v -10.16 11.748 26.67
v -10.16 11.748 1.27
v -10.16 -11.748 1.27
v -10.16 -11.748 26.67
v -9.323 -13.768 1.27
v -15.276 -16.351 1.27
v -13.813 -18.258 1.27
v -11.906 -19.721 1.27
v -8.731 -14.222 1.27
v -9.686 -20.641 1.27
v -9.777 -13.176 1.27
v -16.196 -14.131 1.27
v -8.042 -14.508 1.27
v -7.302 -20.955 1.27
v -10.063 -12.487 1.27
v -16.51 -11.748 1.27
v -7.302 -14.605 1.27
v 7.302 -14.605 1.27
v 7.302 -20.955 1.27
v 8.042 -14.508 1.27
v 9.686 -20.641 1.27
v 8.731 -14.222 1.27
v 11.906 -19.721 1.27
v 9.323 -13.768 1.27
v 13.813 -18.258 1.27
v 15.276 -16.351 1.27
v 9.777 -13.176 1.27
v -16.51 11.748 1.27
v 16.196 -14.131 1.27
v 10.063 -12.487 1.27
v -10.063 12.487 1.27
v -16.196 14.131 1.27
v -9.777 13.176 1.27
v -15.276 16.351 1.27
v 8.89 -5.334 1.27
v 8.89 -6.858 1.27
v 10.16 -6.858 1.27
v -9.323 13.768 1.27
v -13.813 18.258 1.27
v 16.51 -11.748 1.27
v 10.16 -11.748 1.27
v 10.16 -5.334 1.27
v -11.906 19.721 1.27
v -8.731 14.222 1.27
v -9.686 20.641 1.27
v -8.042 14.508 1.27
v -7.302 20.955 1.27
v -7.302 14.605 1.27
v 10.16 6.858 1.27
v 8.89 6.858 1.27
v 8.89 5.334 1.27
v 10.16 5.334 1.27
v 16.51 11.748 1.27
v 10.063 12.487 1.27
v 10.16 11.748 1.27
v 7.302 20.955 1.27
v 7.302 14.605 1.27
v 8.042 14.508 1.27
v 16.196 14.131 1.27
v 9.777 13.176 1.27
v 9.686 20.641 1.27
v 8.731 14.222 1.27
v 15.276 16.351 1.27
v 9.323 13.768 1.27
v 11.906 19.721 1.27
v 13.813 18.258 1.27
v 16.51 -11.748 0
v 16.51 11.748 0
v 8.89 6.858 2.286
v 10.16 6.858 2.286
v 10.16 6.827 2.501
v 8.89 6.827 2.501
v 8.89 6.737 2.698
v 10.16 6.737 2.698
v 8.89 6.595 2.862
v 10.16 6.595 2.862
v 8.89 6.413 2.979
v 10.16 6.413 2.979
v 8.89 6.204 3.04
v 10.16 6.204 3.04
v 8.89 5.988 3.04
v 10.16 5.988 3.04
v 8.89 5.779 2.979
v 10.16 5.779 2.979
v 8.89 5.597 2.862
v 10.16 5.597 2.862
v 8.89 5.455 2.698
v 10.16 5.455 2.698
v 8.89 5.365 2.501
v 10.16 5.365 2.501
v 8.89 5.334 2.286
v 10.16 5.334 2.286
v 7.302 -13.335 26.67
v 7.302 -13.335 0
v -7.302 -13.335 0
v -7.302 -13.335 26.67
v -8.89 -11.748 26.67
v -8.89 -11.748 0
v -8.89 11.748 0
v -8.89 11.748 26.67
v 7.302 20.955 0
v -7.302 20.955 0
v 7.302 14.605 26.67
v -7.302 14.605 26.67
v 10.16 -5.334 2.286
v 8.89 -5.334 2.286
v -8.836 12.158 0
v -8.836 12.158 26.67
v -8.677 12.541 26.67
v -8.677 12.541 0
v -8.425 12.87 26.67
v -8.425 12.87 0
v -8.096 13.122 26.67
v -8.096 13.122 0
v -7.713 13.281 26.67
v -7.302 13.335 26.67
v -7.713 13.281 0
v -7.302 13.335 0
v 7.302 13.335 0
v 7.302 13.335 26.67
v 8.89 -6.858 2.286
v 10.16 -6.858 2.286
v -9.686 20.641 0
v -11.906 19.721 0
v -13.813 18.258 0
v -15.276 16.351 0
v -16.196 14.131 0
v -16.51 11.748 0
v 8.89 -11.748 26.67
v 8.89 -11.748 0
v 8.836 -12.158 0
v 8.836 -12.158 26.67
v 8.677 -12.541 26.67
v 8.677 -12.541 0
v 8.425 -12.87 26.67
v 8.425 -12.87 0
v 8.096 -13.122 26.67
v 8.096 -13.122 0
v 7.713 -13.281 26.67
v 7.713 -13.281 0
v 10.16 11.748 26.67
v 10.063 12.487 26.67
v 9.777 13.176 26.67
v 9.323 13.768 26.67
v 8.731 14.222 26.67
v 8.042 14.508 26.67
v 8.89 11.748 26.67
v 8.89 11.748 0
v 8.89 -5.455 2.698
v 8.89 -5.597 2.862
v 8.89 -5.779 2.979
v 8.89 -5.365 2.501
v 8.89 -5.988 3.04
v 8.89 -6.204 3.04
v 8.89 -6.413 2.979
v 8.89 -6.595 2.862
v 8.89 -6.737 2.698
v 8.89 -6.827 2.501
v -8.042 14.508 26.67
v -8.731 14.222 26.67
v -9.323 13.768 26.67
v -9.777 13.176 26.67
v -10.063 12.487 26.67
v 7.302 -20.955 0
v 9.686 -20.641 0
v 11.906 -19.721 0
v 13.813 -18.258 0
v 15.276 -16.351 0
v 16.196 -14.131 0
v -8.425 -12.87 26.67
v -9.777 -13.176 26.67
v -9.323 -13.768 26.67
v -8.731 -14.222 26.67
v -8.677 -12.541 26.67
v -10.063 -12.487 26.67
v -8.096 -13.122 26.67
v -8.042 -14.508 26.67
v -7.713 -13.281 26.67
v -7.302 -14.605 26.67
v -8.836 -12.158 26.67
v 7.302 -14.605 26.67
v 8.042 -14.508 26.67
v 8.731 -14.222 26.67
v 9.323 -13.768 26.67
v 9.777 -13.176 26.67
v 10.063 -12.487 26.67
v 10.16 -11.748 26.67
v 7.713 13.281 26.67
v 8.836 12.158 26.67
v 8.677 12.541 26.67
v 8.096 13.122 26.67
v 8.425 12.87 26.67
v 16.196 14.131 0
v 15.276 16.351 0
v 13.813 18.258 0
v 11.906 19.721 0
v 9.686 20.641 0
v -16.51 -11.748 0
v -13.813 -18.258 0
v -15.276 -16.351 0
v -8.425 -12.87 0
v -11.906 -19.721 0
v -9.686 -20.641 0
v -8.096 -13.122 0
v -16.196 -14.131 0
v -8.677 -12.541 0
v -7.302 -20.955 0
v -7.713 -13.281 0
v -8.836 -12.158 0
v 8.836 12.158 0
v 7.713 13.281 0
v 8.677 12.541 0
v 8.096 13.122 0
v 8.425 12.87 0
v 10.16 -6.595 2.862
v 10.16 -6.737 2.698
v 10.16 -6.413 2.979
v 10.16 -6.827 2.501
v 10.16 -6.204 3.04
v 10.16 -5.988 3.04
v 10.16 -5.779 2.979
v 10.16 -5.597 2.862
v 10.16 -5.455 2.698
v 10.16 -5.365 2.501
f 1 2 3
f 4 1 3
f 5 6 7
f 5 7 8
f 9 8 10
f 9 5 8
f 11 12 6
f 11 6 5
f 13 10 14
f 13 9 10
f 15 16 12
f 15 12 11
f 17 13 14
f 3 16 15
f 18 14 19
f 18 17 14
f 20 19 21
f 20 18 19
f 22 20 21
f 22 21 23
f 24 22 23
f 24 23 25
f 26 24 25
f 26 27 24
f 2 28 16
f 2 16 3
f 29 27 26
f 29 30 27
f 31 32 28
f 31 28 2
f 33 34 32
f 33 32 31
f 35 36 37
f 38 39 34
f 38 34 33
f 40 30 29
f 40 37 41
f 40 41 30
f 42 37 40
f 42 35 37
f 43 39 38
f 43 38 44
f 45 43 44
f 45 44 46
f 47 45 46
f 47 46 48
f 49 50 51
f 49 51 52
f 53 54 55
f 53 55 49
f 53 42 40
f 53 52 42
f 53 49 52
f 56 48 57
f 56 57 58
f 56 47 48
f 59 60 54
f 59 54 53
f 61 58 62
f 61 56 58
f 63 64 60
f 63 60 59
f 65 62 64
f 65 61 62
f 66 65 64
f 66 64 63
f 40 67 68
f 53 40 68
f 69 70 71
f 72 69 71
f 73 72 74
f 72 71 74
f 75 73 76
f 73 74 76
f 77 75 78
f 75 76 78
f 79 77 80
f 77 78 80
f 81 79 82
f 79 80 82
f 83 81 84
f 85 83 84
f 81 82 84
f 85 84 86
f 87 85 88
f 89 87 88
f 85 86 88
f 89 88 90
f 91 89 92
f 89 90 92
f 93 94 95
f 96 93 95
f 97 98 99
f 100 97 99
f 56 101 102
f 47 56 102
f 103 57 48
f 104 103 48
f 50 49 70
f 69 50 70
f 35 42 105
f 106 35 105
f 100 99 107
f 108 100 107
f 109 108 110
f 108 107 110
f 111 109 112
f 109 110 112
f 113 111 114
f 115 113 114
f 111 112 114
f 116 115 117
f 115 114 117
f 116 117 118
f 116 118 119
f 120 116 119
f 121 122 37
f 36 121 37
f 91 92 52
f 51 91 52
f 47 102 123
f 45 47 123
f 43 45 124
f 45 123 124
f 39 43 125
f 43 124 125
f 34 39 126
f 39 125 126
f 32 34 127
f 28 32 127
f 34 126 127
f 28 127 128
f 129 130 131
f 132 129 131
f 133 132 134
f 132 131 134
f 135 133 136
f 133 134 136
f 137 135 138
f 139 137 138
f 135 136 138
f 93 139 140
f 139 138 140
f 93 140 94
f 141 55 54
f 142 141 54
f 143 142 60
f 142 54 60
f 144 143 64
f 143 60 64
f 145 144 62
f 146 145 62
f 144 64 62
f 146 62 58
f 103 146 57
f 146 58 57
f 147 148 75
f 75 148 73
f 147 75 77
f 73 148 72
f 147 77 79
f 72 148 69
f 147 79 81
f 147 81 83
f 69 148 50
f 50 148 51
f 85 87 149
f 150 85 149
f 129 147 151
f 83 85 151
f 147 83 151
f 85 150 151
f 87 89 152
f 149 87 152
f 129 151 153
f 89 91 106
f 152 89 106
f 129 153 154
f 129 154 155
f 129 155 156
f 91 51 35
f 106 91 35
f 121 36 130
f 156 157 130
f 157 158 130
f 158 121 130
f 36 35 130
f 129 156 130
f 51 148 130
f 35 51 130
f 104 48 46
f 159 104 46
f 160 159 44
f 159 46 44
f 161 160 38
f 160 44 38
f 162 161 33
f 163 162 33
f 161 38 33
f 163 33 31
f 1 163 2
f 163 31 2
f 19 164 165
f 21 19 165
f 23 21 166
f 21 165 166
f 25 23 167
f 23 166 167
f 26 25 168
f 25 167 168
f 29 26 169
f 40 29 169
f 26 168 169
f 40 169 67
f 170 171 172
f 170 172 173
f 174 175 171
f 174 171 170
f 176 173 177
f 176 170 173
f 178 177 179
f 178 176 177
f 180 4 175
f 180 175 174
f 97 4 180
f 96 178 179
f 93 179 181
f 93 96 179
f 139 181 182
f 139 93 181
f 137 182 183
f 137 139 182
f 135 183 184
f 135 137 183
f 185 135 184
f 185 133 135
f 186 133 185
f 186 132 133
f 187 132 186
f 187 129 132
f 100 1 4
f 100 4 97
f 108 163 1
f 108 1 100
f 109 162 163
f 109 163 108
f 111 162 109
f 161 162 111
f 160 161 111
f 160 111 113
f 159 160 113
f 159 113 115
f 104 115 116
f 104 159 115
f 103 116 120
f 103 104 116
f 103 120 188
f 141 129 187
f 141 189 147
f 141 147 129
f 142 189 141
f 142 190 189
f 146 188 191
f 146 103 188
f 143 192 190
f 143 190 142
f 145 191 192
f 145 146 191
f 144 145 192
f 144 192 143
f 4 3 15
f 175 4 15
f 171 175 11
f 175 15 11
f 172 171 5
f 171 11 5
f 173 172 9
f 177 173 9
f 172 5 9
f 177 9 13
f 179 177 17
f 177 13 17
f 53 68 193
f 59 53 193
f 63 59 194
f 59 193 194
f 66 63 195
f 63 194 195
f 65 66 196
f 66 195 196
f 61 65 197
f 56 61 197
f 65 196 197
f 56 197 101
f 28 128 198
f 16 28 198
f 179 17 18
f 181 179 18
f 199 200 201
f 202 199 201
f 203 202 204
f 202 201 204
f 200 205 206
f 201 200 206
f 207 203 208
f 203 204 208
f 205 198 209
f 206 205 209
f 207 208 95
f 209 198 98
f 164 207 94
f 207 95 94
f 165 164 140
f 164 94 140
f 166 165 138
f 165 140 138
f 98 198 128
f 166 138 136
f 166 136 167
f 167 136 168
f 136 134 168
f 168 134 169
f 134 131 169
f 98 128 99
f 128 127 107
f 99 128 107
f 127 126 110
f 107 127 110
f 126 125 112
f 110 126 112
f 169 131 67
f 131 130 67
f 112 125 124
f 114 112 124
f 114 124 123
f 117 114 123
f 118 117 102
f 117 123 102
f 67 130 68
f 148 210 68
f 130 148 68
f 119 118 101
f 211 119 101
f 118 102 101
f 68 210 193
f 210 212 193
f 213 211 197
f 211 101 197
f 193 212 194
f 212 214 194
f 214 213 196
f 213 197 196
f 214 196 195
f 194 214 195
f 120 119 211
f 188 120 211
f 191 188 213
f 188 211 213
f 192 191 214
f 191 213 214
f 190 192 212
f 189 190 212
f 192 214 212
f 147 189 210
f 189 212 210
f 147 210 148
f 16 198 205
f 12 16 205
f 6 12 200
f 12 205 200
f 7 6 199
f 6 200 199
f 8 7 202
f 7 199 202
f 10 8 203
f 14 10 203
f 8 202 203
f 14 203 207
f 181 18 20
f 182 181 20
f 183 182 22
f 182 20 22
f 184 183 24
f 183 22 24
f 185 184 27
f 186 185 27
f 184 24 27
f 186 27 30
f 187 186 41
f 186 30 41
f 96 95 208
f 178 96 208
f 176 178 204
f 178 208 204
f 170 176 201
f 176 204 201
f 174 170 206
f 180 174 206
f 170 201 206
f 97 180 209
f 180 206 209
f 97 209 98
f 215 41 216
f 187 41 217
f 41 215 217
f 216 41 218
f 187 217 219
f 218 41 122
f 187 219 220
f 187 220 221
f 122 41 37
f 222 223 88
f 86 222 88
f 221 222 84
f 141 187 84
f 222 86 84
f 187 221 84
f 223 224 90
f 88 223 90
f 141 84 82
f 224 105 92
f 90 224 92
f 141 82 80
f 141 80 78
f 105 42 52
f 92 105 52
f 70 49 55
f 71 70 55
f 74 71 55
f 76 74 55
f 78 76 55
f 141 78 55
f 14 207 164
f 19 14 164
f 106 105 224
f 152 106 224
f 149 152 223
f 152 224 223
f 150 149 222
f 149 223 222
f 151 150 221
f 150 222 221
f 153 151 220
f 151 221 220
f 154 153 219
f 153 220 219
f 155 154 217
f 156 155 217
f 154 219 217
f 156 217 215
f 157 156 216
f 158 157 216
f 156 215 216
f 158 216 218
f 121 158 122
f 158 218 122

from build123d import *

# Parameters (mm, degrees)
F1_DEPTH = 25.4
F2_DEPTH = 1.27
F4_DEPTH = 1.27


with BuildPart() as f1:
    # F0 (on Top) → F1 (new body)
    with BuildSketch(Plane.XY):
        with BuildLine():
            Line((10.16, -11.7475), (10.16, 11.7475))
            ThreePointArc((10.16, 11.7475), (9.323058, 13.768058), (7.3025, 14.605))
            Line((7.3025, 14.605), (-7.3025, 14.605))
            ThreePointArc((-7.3025, 14.605), (-9.323058, 13.768058), (-10.16, 11.7475))
            Line((-10.16, 11.7475), (-10.16, -11.7475))
            ThreePointArc((-10.16, -11.7475), (-9.323058, -13.768058), (-7.3025, -14.605))
            Line((-7.3025, -14.605), (7.3025, -14.605))
            ThreePointArc((7.3025, -14.605), (9.323058, -13.768058), (10.16, -11.7475))
        make_face()
        with BuildLine():
            Line((-7.3025, 13.335), (7.3025, 13.335))
            ThreePointArc((7.3025, 13.335), (8.425032, 12.870032), (8.89, 11.7475))
            Line((8.89, 11.7475), (8.89, -11.7475))
            ThreePointArc((8.89, -11.7475), (8.425032, -12.870032), (7.3025, -13.335))
            Line((7.3025, -13.335), (-7.3025, -13.335))
            ThreePointArc((-7.3025, -13.335), (-8.425032, -12.870032), (-8.89, -11.7475))
            Line((-8.89, -11.7475), (-8.89, 11.7475))
            ThreePointArc((-8.89, 11.7475), (-8.425032, 12.870032), (-7.3025, 13.335))
        make_face(mode=Mode.SUBTRACT)
    extrude(amount=F1_DEPTH)

    # F0 (on Top) + F1_face (on face) → F2 (join)
    with BuildSketch(Plane.XY):
        with BuildLine():
            Line((7.3025, 20.955), (-7.3025, 20.955))
            ThreePointArc((-7.3025, 20.955), (-13.813186, 18.258186), (-16.51, 11.7475))
            Line((-16.51, 11.7475), (-16.51, -11.7475))
            ThreePointArc((-16.51, -11.7475), (-13.813186, -18.258186), (-7.3025, -20.955))
            Line((-7.3025, -20.955), (7.3025, -20.955))
            ThreePointArc((7.3025, -20.955), (13.813186, -18.258186), (16.51, -11.7475))
            Line((16.51, -11.7475), (16.51, 11.7475))
            ThreePointArc((16.51, 11.7475), (13.813186, 18.258186), (7.3025, 20.955))
        make_face()
        with BuildLine():
            ThreePointArc((7.3025, 14.605), (9.323058, 13.768058), (10.16, 11.7475))
            Line((10.16, 11.7475), (10.16, -11.7475))
            ThreePointArc((10.16, -11.7475), (9.323058, -13.768058), (7.3025, -14.605))
            Line((7.3025, -14.605), (-7.3025, -14.605))
            ThreePointArc((-7.3025, -14.605), (-9.323058, -13.768058), (-10.16, -11.7475))
            Line((-10.16, -11.7475), (-10.16, 11.7475))
            ThreePointArc((-10.16, 11.7475), (-9.323058, 13.768058), (-7.3025, 14.605))
            Line((-7.3025, 14.605), (7.3025, 14.605))
        make_face(mode=Mode.SUBTRACT)
    with BuildSketch(Plane.XY.offset(25.4)):
        with BuildLine():
            Line((10.16, -11.7475), (10.16, 11.7475))
            ThreePointArc((10.16, 11.7475), (9.323058, 13.768058), (7.3025, 14.605))
            Line((7.3025, 14.605), (-7.3025, 14.605))
            ThreePointArc((-7.3025, 14.605), (-9.323058, 13.768058), (-10.16, 11.7475))
            Line((-10.16, 11.7475), (-10.16, -11.7475))
            ThreePointArc((-10.16, -11.7475), (-9.323058, -13.768058), (-7.3025, -14.605))
            Line((-7.3025, -14.605), (7.3025, -14.605))
            ThreePointArc((7.3025, -14.605), (9.323058, -13.768058), (10.16, -11.7475))
        make_face()
        with BuildLine():
            Line((-8.89, -11.7475), (-8.89, 11.7475))
            ThreePointArc((-8.89, 11.7475), (-8.425032, 12.870032), (-7.3025, 13.335))
            Line((-7.3025, 13.335), (7.3025, 13.335))
            ThreePointArc((7.3025, 13.335), (8.425032, 12.870032), (8.89, 11.7475))
            Line((8.89, 11.7475), (8.89, -11.7475))
            ThreePointArc((8.89, -11.7475), (8.425032, -12.870032), (7.3025, -13.335))
            Line((7.3025, -13.335), (-7.3025, -13.335))
            ThreePointArc((-7.3025, -13.335), (-8.425032, -12.870032), (-8.89, -11.7475))
        make_face(mode=Mode.SUBTRACT)
    extrude(amount=F2_DEPTH)

    # F3 (on face) → F4 (cut, through all)
    with BuildSketch(Plane.YZ.offset(10.16)):
        with BuildLine():
            Line((-6.858, 2.286), (-6.858, 1.27))
            Line((-6.858, 1.27), (-5.334, 1.27))
            Line((-5.334, 1.27), (-5.334, 2.286))
            ThreePointArc((-5.334, 2.286), (-6.096, 3.048), (-6.858, 2.286))
        make_face()
        with BuildLine():
            ThreePointArc((6.858, 2.286), (6.096, 3.048), (5.334, 2.286))
            Line((5.334, 2.286), (5.334, 1.27))
            Line((5.334, 1.27), (6.858, 1.27))
            Line((6.858, 1.27), (6.858, 2.286))
        make_face()
    extrude(amount=-F4_DEPTH, mode=Mode.SUBTRACT)


solid = f1.part
